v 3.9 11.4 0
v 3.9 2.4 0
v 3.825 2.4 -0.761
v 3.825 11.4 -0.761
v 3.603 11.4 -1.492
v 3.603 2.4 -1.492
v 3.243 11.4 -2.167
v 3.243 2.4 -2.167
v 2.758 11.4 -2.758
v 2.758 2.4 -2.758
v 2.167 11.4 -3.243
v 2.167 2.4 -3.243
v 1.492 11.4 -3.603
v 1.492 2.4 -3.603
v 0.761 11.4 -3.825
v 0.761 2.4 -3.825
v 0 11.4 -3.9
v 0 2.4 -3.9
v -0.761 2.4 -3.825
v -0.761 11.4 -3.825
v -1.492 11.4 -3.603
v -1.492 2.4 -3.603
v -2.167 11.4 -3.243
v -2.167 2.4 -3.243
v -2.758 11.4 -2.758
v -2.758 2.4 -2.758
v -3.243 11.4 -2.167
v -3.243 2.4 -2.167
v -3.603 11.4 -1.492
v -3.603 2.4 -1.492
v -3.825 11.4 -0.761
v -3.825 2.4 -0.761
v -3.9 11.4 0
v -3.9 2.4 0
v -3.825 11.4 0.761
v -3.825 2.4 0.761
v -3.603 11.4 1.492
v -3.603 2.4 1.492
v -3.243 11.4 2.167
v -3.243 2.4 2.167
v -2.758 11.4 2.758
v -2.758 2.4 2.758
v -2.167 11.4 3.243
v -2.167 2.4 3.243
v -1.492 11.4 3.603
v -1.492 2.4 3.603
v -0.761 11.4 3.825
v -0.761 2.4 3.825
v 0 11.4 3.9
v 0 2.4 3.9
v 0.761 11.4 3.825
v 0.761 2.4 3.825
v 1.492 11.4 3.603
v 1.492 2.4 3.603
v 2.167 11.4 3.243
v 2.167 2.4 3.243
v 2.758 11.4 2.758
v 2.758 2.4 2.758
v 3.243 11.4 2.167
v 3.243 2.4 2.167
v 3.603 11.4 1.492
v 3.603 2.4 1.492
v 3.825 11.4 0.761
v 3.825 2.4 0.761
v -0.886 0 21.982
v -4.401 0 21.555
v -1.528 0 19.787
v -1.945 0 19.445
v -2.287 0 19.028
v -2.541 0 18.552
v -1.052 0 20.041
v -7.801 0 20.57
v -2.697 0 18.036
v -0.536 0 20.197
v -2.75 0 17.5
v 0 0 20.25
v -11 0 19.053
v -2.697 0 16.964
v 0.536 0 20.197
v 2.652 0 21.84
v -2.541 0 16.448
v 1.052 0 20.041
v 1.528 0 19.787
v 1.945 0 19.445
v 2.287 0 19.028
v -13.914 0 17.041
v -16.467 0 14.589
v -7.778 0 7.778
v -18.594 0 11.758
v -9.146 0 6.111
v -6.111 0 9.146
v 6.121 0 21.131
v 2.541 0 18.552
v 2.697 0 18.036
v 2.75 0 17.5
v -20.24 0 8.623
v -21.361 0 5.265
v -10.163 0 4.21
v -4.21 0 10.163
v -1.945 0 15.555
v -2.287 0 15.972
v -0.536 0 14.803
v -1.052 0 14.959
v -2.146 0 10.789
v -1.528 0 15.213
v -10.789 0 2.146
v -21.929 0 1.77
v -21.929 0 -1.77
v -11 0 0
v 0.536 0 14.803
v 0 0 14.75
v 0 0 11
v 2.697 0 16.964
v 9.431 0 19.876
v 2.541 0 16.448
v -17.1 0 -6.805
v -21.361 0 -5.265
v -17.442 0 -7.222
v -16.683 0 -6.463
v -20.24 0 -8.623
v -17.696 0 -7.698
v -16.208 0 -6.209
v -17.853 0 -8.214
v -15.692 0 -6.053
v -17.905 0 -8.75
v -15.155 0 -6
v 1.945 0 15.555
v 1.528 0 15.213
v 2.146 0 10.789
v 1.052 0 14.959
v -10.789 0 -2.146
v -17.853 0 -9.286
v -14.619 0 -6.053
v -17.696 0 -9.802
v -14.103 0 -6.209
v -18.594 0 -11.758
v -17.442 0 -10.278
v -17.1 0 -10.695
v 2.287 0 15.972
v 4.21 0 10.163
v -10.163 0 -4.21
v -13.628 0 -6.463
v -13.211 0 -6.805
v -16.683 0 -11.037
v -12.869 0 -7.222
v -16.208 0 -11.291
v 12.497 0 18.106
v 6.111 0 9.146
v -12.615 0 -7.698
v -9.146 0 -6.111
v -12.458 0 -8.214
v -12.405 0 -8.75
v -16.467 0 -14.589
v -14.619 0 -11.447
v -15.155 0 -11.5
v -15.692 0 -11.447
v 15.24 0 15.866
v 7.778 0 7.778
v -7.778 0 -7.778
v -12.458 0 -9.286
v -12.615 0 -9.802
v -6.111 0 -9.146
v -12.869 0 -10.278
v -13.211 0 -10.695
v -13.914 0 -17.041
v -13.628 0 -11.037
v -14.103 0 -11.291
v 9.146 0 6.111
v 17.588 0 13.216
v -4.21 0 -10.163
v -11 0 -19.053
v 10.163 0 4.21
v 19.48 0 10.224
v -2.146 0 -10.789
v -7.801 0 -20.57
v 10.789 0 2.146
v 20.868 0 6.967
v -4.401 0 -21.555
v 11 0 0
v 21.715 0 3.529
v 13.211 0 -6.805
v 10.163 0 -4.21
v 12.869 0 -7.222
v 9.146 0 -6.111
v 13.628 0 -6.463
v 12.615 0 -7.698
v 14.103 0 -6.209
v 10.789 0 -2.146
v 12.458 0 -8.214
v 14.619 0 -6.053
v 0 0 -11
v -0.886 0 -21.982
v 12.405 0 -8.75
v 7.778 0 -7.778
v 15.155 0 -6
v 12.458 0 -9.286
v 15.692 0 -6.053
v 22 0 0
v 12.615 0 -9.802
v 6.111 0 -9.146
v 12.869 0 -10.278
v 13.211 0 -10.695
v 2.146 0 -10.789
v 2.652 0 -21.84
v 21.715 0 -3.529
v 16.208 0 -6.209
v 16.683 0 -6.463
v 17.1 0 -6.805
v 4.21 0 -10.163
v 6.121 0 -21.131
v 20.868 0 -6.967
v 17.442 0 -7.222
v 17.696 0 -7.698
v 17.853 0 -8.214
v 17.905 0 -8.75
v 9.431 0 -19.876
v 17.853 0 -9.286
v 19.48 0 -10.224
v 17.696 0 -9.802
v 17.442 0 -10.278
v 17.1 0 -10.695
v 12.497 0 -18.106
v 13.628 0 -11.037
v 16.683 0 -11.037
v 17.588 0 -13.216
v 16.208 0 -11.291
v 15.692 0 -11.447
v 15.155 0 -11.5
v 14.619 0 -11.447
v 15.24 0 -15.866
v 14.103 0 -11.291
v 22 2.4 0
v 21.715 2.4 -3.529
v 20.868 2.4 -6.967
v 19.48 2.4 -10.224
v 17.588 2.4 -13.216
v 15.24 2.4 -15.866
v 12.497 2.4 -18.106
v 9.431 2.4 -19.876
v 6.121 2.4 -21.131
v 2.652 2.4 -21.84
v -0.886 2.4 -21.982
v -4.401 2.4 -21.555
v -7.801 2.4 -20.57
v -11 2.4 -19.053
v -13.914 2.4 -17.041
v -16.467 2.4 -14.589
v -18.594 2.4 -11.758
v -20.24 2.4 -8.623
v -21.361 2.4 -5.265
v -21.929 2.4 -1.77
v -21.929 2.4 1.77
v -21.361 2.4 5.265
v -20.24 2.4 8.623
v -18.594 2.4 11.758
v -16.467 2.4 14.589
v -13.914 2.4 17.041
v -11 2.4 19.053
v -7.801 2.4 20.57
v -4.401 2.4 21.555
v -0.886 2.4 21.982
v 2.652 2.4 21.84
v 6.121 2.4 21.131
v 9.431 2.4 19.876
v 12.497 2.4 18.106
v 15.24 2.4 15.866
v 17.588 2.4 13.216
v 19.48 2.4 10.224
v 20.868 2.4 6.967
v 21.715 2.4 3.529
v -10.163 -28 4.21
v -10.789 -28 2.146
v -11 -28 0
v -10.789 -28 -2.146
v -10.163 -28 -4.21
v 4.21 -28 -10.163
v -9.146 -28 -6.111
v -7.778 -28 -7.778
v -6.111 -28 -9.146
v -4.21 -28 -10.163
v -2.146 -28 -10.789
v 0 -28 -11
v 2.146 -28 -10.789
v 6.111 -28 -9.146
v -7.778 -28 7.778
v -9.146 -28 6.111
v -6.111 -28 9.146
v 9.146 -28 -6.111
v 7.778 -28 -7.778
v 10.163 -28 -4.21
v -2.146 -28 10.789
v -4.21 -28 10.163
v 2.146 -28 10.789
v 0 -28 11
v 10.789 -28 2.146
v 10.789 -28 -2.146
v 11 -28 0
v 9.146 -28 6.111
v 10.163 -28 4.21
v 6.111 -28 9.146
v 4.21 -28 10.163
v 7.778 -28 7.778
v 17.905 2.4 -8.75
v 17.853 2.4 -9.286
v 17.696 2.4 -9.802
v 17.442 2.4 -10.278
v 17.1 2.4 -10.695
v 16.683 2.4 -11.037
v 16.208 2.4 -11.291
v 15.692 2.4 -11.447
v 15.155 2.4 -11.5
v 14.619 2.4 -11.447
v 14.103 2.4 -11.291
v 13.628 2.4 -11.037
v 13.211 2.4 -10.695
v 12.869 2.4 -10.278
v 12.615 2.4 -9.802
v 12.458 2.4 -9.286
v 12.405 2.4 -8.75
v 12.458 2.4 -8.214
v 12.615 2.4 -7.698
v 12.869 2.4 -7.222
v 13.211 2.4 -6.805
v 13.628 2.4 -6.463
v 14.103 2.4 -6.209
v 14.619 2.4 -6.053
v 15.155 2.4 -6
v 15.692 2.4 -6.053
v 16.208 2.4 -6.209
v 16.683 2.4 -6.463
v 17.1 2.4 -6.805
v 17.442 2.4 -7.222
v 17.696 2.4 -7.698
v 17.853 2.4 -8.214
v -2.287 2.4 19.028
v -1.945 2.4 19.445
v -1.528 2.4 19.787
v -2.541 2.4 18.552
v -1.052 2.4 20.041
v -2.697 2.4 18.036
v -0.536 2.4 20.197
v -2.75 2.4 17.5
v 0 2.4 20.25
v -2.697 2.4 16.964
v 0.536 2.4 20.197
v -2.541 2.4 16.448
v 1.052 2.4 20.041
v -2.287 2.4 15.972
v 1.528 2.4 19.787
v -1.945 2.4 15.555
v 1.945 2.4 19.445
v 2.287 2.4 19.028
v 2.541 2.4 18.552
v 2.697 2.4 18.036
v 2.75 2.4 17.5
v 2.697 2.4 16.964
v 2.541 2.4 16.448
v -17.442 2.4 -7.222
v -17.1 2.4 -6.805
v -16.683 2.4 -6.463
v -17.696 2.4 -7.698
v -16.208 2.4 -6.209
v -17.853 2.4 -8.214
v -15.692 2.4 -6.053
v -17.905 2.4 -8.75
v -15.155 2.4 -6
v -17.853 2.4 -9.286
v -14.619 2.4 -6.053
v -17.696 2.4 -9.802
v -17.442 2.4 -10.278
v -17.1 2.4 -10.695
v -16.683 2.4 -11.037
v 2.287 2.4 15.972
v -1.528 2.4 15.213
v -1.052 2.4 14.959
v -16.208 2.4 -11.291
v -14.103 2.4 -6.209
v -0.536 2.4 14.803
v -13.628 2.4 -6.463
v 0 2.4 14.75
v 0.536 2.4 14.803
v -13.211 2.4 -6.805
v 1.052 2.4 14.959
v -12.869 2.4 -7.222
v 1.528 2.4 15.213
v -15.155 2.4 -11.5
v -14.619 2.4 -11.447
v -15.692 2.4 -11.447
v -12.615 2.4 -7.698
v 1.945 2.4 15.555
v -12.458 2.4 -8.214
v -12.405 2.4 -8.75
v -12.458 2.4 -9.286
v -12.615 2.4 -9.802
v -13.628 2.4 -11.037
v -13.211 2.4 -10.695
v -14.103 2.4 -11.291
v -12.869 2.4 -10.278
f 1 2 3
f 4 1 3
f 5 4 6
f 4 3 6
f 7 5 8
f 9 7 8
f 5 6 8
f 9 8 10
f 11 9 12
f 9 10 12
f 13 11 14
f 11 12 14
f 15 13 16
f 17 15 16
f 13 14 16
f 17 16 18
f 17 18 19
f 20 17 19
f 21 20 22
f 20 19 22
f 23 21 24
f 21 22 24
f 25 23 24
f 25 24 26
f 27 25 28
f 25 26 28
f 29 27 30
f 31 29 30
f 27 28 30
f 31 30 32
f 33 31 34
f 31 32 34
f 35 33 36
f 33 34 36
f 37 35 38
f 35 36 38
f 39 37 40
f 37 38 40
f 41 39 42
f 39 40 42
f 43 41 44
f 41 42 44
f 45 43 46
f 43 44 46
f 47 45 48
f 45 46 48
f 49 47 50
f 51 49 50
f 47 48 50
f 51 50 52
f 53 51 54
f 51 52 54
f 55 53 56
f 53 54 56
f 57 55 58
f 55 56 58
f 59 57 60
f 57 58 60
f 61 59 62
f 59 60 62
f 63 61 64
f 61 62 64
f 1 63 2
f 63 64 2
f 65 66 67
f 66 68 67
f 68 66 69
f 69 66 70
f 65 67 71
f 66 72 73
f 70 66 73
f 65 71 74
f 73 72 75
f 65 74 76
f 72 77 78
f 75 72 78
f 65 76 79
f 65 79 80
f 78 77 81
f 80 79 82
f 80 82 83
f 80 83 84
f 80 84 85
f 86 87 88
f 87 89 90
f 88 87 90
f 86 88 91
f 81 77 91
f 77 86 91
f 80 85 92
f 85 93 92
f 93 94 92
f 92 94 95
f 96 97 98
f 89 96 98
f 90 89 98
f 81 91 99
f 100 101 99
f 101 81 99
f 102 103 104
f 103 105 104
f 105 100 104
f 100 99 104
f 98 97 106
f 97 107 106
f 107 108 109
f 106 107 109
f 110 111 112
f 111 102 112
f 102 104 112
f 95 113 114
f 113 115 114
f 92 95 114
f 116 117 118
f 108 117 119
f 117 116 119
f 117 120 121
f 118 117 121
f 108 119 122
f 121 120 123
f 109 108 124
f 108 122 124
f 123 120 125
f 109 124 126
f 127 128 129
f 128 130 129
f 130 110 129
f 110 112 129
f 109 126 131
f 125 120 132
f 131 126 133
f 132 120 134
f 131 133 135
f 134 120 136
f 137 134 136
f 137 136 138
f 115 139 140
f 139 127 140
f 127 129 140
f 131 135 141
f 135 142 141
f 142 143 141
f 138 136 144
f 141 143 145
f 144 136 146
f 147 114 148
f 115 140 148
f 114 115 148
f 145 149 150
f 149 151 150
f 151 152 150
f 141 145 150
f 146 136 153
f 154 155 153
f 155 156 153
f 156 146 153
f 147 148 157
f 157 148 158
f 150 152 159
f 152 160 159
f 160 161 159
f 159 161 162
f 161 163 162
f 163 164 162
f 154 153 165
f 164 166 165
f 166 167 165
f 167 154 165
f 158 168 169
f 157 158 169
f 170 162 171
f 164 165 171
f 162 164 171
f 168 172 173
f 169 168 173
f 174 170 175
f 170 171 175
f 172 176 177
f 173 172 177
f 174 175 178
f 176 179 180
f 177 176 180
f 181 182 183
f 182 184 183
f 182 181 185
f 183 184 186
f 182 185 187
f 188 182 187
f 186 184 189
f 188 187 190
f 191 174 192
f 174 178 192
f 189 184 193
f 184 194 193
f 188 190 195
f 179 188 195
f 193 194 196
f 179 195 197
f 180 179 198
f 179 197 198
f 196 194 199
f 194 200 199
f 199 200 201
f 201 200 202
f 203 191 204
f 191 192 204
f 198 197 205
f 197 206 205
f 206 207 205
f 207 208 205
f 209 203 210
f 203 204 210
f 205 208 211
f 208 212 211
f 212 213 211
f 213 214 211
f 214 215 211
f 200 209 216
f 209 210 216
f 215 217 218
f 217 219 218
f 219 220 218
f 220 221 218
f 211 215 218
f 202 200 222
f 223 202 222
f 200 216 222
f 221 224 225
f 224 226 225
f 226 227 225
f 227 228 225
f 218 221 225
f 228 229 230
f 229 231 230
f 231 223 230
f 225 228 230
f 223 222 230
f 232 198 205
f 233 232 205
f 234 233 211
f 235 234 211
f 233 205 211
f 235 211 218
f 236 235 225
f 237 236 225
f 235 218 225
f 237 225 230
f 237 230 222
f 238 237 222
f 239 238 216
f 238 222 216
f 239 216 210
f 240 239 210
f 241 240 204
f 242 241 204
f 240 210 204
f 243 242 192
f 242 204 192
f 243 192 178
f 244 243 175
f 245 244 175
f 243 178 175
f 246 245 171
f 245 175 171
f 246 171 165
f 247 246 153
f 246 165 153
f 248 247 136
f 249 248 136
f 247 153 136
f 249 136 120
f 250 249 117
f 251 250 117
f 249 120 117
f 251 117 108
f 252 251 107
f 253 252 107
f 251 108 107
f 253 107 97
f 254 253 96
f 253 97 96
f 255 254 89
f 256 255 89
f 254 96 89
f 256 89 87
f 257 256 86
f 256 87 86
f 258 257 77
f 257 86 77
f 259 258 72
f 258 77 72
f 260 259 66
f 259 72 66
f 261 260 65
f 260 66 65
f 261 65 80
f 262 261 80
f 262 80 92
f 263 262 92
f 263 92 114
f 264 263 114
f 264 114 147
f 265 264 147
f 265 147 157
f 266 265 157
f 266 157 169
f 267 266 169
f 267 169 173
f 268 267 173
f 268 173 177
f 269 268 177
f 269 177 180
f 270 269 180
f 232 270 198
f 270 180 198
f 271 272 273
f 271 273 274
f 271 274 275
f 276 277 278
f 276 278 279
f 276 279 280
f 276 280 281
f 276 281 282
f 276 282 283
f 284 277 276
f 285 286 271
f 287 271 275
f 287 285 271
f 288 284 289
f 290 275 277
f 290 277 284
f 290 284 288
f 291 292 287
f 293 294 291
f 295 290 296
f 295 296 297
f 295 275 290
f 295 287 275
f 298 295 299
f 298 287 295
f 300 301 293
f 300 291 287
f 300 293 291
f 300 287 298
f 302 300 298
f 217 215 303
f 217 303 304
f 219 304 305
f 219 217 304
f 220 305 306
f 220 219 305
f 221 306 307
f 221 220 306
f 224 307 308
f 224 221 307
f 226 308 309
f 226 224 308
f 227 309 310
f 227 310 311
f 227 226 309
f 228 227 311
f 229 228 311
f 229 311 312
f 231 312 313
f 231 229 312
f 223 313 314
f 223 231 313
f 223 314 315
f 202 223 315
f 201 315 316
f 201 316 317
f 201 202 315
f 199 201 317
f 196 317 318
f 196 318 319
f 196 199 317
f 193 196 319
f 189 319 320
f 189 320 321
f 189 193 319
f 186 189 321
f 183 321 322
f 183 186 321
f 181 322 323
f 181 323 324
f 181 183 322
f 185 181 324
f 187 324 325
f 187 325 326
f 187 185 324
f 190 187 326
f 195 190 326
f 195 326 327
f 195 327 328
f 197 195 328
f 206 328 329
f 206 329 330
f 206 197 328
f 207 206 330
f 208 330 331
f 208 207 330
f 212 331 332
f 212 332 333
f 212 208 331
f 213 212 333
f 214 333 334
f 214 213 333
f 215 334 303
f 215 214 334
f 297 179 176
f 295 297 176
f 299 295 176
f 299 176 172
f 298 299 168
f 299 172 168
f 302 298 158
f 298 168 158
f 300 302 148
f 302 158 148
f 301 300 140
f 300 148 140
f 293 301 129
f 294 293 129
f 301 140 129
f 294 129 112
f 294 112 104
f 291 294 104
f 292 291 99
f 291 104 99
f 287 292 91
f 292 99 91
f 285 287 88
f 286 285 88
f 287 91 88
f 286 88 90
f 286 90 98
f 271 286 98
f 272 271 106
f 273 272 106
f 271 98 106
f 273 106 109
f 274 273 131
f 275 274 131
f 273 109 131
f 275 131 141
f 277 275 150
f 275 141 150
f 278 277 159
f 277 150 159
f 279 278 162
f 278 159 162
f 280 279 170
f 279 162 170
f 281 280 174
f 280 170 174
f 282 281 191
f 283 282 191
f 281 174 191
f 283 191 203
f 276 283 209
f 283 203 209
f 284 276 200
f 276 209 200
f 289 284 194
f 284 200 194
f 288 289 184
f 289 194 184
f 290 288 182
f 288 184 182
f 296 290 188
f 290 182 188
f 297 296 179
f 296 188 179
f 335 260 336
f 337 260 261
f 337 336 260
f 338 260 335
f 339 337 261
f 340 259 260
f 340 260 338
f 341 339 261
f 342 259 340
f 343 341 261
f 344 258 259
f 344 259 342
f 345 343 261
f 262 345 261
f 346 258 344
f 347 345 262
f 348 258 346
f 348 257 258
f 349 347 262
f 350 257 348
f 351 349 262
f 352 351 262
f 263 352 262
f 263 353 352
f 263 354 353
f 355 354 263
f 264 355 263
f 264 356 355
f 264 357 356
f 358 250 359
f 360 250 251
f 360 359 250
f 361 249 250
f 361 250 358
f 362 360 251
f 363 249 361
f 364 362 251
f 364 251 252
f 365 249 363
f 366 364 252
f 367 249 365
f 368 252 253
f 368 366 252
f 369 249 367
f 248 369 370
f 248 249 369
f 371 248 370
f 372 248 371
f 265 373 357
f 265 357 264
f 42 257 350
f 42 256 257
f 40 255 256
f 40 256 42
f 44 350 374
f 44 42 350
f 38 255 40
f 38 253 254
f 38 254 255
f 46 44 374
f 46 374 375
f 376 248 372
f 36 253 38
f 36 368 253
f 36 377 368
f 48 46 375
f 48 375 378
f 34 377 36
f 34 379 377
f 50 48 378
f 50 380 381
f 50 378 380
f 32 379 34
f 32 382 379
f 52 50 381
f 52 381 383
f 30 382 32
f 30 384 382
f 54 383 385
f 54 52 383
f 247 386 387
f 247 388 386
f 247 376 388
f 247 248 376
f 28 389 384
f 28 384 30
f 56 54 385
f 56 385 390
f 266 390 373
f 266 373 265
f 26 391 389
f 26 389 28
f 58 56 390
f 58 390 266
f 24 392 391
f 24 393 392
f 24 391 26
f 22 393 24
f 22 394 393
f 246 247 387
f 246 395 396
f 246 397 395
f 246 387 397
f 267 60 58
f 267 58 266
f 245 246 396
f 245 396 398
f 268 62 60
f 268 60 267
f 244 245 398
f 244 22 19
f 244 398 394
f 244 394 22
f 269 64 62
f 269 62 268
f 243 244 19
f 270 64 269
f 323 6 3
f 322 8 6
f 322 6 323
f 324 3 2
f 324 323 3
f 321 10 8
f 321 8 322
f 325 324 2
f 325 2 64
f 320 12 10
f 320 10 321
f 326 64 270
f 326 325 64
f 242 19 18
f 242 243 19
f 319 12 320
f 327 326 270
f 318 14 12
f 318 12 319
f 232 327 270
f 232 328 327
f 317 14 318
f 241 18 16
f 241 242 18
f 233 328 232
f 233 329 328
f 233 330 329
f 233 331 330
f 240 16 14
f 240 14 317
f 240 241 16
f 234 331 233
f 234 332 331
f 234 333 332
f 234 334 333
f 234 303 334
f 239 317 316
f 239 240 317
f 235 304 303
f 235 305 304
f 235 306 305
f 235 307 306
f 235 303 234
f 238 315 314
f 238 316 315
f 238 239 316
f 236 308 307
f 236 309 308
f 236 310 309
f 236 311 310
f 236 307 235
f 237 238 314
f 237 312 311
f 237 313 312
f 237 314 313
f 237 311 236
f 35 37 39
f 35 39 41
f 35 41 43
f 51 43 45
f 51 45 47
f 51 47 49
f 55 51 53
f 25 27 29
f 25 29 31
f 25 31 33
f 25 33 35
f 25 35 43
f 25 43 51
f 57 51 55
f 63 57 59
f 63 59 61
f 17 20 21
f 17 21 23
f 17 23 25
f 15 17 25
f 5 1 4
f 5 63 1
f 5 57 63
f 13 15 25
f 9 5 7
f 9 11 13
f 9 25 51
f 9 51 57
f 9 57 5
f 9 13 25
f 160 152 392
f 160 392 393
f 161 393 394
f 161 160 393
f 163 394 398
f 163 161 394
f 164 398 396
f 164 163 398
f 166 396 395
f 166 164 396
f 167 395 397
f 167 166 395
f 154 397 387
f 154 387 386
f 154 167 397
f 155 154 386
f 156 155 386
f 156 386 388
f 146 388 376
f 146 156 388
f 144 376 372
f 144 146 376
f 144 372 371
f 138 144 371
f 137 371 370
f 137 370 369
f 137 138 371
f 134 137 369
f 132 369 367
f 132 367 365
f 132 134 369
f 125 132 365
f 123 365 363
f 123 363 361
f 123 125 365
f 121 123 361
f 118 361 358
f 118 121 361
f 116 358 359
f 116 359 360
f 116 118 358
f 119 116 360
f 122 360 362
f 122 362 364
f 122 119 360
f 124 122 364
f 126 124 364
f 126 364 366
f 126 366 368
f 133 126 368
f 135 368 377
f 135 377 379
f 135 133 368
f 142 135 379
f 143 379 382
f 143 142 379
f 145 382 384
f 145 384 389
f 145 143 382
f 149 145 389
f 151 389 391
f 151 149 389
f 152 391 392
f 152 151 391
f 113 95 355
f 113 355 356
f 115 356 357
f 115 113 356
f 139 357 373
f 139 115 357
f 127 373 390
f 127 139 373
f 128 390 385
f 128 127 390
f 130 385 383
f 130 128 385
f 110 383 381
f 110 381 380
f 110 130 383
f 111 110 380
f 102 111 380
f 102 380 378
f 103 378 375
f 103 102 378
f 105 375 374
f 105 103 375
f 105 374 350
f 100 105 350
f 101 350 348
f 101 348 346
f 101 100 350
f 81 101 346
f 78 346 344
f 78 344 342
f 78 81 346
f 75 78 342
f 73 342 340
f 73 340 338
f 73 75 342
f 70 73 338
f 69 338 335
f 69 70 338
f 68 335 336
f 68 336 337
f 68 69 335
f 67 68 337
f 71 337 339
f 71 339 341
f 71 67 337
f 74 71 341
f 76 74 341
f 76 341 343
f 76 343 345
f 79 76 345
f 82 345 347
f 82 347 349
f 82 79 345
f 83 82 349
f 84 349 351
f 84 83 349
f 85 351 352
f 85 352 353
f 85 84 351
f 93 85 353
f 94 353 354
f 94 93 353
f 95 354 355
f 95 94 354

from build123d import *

# Parameters (mm, degrees)
SKETCH2_R           = 22
SKETCH2_R_2         = 2.75
BOSS_EXTRUDE1_DEPTH = 2.4
SKETCH3_R           = 3.9
BOSS_EXTRUDE2_DEPTH = 9
SKETCH4_R           = 11
BOSS_EXTRUDE3_DEPTH = 28


with BuildPart() as part:
    # Sketch2 → Boss-Extrude1 (new body)
    with BuildSketch(Plane(origin=(0, 0, 0), x_dir=(1, 0, 0), z_dir=(0, 1, 0))):
        Circle(SKETCH2_R)
        with Locations((15.155444566, 8.75)):
            Circle(SKETCH2_R_2, mode=Mode.SUBTRACT)
        with Locations((-15.155444566, 8.75)):
            Circle(SKETCH2_R_2, mode=Mode.SUBTRACT)
        with Locations((0, -17.5)):
            Circle(SKETCH2_R_2, mode=Mode.SUBTRACT)
    extrude(amount=BOSS_EXTRUDE1_DEPTH)

    # Sketch3 → Boss-Extrude2 (add)
    with BuildSketch(Plane(origin=(0, 2.4, 0), x_dir=(1, 0, 0), z_dir=(0, 1, 0))):
        Circle(SKETCH3_R)
    extrude(amount=BOSS_EXTRUDE2_DEPTH)

    # Sketch4 → Boss-Extrude3 (add)
    with BuildSketch(Plane.XZ):
        Circle(SKETCH4_R)
    extrude(amount=BOSS_EXTRUDE3_DEPTH)


solid = part.part
